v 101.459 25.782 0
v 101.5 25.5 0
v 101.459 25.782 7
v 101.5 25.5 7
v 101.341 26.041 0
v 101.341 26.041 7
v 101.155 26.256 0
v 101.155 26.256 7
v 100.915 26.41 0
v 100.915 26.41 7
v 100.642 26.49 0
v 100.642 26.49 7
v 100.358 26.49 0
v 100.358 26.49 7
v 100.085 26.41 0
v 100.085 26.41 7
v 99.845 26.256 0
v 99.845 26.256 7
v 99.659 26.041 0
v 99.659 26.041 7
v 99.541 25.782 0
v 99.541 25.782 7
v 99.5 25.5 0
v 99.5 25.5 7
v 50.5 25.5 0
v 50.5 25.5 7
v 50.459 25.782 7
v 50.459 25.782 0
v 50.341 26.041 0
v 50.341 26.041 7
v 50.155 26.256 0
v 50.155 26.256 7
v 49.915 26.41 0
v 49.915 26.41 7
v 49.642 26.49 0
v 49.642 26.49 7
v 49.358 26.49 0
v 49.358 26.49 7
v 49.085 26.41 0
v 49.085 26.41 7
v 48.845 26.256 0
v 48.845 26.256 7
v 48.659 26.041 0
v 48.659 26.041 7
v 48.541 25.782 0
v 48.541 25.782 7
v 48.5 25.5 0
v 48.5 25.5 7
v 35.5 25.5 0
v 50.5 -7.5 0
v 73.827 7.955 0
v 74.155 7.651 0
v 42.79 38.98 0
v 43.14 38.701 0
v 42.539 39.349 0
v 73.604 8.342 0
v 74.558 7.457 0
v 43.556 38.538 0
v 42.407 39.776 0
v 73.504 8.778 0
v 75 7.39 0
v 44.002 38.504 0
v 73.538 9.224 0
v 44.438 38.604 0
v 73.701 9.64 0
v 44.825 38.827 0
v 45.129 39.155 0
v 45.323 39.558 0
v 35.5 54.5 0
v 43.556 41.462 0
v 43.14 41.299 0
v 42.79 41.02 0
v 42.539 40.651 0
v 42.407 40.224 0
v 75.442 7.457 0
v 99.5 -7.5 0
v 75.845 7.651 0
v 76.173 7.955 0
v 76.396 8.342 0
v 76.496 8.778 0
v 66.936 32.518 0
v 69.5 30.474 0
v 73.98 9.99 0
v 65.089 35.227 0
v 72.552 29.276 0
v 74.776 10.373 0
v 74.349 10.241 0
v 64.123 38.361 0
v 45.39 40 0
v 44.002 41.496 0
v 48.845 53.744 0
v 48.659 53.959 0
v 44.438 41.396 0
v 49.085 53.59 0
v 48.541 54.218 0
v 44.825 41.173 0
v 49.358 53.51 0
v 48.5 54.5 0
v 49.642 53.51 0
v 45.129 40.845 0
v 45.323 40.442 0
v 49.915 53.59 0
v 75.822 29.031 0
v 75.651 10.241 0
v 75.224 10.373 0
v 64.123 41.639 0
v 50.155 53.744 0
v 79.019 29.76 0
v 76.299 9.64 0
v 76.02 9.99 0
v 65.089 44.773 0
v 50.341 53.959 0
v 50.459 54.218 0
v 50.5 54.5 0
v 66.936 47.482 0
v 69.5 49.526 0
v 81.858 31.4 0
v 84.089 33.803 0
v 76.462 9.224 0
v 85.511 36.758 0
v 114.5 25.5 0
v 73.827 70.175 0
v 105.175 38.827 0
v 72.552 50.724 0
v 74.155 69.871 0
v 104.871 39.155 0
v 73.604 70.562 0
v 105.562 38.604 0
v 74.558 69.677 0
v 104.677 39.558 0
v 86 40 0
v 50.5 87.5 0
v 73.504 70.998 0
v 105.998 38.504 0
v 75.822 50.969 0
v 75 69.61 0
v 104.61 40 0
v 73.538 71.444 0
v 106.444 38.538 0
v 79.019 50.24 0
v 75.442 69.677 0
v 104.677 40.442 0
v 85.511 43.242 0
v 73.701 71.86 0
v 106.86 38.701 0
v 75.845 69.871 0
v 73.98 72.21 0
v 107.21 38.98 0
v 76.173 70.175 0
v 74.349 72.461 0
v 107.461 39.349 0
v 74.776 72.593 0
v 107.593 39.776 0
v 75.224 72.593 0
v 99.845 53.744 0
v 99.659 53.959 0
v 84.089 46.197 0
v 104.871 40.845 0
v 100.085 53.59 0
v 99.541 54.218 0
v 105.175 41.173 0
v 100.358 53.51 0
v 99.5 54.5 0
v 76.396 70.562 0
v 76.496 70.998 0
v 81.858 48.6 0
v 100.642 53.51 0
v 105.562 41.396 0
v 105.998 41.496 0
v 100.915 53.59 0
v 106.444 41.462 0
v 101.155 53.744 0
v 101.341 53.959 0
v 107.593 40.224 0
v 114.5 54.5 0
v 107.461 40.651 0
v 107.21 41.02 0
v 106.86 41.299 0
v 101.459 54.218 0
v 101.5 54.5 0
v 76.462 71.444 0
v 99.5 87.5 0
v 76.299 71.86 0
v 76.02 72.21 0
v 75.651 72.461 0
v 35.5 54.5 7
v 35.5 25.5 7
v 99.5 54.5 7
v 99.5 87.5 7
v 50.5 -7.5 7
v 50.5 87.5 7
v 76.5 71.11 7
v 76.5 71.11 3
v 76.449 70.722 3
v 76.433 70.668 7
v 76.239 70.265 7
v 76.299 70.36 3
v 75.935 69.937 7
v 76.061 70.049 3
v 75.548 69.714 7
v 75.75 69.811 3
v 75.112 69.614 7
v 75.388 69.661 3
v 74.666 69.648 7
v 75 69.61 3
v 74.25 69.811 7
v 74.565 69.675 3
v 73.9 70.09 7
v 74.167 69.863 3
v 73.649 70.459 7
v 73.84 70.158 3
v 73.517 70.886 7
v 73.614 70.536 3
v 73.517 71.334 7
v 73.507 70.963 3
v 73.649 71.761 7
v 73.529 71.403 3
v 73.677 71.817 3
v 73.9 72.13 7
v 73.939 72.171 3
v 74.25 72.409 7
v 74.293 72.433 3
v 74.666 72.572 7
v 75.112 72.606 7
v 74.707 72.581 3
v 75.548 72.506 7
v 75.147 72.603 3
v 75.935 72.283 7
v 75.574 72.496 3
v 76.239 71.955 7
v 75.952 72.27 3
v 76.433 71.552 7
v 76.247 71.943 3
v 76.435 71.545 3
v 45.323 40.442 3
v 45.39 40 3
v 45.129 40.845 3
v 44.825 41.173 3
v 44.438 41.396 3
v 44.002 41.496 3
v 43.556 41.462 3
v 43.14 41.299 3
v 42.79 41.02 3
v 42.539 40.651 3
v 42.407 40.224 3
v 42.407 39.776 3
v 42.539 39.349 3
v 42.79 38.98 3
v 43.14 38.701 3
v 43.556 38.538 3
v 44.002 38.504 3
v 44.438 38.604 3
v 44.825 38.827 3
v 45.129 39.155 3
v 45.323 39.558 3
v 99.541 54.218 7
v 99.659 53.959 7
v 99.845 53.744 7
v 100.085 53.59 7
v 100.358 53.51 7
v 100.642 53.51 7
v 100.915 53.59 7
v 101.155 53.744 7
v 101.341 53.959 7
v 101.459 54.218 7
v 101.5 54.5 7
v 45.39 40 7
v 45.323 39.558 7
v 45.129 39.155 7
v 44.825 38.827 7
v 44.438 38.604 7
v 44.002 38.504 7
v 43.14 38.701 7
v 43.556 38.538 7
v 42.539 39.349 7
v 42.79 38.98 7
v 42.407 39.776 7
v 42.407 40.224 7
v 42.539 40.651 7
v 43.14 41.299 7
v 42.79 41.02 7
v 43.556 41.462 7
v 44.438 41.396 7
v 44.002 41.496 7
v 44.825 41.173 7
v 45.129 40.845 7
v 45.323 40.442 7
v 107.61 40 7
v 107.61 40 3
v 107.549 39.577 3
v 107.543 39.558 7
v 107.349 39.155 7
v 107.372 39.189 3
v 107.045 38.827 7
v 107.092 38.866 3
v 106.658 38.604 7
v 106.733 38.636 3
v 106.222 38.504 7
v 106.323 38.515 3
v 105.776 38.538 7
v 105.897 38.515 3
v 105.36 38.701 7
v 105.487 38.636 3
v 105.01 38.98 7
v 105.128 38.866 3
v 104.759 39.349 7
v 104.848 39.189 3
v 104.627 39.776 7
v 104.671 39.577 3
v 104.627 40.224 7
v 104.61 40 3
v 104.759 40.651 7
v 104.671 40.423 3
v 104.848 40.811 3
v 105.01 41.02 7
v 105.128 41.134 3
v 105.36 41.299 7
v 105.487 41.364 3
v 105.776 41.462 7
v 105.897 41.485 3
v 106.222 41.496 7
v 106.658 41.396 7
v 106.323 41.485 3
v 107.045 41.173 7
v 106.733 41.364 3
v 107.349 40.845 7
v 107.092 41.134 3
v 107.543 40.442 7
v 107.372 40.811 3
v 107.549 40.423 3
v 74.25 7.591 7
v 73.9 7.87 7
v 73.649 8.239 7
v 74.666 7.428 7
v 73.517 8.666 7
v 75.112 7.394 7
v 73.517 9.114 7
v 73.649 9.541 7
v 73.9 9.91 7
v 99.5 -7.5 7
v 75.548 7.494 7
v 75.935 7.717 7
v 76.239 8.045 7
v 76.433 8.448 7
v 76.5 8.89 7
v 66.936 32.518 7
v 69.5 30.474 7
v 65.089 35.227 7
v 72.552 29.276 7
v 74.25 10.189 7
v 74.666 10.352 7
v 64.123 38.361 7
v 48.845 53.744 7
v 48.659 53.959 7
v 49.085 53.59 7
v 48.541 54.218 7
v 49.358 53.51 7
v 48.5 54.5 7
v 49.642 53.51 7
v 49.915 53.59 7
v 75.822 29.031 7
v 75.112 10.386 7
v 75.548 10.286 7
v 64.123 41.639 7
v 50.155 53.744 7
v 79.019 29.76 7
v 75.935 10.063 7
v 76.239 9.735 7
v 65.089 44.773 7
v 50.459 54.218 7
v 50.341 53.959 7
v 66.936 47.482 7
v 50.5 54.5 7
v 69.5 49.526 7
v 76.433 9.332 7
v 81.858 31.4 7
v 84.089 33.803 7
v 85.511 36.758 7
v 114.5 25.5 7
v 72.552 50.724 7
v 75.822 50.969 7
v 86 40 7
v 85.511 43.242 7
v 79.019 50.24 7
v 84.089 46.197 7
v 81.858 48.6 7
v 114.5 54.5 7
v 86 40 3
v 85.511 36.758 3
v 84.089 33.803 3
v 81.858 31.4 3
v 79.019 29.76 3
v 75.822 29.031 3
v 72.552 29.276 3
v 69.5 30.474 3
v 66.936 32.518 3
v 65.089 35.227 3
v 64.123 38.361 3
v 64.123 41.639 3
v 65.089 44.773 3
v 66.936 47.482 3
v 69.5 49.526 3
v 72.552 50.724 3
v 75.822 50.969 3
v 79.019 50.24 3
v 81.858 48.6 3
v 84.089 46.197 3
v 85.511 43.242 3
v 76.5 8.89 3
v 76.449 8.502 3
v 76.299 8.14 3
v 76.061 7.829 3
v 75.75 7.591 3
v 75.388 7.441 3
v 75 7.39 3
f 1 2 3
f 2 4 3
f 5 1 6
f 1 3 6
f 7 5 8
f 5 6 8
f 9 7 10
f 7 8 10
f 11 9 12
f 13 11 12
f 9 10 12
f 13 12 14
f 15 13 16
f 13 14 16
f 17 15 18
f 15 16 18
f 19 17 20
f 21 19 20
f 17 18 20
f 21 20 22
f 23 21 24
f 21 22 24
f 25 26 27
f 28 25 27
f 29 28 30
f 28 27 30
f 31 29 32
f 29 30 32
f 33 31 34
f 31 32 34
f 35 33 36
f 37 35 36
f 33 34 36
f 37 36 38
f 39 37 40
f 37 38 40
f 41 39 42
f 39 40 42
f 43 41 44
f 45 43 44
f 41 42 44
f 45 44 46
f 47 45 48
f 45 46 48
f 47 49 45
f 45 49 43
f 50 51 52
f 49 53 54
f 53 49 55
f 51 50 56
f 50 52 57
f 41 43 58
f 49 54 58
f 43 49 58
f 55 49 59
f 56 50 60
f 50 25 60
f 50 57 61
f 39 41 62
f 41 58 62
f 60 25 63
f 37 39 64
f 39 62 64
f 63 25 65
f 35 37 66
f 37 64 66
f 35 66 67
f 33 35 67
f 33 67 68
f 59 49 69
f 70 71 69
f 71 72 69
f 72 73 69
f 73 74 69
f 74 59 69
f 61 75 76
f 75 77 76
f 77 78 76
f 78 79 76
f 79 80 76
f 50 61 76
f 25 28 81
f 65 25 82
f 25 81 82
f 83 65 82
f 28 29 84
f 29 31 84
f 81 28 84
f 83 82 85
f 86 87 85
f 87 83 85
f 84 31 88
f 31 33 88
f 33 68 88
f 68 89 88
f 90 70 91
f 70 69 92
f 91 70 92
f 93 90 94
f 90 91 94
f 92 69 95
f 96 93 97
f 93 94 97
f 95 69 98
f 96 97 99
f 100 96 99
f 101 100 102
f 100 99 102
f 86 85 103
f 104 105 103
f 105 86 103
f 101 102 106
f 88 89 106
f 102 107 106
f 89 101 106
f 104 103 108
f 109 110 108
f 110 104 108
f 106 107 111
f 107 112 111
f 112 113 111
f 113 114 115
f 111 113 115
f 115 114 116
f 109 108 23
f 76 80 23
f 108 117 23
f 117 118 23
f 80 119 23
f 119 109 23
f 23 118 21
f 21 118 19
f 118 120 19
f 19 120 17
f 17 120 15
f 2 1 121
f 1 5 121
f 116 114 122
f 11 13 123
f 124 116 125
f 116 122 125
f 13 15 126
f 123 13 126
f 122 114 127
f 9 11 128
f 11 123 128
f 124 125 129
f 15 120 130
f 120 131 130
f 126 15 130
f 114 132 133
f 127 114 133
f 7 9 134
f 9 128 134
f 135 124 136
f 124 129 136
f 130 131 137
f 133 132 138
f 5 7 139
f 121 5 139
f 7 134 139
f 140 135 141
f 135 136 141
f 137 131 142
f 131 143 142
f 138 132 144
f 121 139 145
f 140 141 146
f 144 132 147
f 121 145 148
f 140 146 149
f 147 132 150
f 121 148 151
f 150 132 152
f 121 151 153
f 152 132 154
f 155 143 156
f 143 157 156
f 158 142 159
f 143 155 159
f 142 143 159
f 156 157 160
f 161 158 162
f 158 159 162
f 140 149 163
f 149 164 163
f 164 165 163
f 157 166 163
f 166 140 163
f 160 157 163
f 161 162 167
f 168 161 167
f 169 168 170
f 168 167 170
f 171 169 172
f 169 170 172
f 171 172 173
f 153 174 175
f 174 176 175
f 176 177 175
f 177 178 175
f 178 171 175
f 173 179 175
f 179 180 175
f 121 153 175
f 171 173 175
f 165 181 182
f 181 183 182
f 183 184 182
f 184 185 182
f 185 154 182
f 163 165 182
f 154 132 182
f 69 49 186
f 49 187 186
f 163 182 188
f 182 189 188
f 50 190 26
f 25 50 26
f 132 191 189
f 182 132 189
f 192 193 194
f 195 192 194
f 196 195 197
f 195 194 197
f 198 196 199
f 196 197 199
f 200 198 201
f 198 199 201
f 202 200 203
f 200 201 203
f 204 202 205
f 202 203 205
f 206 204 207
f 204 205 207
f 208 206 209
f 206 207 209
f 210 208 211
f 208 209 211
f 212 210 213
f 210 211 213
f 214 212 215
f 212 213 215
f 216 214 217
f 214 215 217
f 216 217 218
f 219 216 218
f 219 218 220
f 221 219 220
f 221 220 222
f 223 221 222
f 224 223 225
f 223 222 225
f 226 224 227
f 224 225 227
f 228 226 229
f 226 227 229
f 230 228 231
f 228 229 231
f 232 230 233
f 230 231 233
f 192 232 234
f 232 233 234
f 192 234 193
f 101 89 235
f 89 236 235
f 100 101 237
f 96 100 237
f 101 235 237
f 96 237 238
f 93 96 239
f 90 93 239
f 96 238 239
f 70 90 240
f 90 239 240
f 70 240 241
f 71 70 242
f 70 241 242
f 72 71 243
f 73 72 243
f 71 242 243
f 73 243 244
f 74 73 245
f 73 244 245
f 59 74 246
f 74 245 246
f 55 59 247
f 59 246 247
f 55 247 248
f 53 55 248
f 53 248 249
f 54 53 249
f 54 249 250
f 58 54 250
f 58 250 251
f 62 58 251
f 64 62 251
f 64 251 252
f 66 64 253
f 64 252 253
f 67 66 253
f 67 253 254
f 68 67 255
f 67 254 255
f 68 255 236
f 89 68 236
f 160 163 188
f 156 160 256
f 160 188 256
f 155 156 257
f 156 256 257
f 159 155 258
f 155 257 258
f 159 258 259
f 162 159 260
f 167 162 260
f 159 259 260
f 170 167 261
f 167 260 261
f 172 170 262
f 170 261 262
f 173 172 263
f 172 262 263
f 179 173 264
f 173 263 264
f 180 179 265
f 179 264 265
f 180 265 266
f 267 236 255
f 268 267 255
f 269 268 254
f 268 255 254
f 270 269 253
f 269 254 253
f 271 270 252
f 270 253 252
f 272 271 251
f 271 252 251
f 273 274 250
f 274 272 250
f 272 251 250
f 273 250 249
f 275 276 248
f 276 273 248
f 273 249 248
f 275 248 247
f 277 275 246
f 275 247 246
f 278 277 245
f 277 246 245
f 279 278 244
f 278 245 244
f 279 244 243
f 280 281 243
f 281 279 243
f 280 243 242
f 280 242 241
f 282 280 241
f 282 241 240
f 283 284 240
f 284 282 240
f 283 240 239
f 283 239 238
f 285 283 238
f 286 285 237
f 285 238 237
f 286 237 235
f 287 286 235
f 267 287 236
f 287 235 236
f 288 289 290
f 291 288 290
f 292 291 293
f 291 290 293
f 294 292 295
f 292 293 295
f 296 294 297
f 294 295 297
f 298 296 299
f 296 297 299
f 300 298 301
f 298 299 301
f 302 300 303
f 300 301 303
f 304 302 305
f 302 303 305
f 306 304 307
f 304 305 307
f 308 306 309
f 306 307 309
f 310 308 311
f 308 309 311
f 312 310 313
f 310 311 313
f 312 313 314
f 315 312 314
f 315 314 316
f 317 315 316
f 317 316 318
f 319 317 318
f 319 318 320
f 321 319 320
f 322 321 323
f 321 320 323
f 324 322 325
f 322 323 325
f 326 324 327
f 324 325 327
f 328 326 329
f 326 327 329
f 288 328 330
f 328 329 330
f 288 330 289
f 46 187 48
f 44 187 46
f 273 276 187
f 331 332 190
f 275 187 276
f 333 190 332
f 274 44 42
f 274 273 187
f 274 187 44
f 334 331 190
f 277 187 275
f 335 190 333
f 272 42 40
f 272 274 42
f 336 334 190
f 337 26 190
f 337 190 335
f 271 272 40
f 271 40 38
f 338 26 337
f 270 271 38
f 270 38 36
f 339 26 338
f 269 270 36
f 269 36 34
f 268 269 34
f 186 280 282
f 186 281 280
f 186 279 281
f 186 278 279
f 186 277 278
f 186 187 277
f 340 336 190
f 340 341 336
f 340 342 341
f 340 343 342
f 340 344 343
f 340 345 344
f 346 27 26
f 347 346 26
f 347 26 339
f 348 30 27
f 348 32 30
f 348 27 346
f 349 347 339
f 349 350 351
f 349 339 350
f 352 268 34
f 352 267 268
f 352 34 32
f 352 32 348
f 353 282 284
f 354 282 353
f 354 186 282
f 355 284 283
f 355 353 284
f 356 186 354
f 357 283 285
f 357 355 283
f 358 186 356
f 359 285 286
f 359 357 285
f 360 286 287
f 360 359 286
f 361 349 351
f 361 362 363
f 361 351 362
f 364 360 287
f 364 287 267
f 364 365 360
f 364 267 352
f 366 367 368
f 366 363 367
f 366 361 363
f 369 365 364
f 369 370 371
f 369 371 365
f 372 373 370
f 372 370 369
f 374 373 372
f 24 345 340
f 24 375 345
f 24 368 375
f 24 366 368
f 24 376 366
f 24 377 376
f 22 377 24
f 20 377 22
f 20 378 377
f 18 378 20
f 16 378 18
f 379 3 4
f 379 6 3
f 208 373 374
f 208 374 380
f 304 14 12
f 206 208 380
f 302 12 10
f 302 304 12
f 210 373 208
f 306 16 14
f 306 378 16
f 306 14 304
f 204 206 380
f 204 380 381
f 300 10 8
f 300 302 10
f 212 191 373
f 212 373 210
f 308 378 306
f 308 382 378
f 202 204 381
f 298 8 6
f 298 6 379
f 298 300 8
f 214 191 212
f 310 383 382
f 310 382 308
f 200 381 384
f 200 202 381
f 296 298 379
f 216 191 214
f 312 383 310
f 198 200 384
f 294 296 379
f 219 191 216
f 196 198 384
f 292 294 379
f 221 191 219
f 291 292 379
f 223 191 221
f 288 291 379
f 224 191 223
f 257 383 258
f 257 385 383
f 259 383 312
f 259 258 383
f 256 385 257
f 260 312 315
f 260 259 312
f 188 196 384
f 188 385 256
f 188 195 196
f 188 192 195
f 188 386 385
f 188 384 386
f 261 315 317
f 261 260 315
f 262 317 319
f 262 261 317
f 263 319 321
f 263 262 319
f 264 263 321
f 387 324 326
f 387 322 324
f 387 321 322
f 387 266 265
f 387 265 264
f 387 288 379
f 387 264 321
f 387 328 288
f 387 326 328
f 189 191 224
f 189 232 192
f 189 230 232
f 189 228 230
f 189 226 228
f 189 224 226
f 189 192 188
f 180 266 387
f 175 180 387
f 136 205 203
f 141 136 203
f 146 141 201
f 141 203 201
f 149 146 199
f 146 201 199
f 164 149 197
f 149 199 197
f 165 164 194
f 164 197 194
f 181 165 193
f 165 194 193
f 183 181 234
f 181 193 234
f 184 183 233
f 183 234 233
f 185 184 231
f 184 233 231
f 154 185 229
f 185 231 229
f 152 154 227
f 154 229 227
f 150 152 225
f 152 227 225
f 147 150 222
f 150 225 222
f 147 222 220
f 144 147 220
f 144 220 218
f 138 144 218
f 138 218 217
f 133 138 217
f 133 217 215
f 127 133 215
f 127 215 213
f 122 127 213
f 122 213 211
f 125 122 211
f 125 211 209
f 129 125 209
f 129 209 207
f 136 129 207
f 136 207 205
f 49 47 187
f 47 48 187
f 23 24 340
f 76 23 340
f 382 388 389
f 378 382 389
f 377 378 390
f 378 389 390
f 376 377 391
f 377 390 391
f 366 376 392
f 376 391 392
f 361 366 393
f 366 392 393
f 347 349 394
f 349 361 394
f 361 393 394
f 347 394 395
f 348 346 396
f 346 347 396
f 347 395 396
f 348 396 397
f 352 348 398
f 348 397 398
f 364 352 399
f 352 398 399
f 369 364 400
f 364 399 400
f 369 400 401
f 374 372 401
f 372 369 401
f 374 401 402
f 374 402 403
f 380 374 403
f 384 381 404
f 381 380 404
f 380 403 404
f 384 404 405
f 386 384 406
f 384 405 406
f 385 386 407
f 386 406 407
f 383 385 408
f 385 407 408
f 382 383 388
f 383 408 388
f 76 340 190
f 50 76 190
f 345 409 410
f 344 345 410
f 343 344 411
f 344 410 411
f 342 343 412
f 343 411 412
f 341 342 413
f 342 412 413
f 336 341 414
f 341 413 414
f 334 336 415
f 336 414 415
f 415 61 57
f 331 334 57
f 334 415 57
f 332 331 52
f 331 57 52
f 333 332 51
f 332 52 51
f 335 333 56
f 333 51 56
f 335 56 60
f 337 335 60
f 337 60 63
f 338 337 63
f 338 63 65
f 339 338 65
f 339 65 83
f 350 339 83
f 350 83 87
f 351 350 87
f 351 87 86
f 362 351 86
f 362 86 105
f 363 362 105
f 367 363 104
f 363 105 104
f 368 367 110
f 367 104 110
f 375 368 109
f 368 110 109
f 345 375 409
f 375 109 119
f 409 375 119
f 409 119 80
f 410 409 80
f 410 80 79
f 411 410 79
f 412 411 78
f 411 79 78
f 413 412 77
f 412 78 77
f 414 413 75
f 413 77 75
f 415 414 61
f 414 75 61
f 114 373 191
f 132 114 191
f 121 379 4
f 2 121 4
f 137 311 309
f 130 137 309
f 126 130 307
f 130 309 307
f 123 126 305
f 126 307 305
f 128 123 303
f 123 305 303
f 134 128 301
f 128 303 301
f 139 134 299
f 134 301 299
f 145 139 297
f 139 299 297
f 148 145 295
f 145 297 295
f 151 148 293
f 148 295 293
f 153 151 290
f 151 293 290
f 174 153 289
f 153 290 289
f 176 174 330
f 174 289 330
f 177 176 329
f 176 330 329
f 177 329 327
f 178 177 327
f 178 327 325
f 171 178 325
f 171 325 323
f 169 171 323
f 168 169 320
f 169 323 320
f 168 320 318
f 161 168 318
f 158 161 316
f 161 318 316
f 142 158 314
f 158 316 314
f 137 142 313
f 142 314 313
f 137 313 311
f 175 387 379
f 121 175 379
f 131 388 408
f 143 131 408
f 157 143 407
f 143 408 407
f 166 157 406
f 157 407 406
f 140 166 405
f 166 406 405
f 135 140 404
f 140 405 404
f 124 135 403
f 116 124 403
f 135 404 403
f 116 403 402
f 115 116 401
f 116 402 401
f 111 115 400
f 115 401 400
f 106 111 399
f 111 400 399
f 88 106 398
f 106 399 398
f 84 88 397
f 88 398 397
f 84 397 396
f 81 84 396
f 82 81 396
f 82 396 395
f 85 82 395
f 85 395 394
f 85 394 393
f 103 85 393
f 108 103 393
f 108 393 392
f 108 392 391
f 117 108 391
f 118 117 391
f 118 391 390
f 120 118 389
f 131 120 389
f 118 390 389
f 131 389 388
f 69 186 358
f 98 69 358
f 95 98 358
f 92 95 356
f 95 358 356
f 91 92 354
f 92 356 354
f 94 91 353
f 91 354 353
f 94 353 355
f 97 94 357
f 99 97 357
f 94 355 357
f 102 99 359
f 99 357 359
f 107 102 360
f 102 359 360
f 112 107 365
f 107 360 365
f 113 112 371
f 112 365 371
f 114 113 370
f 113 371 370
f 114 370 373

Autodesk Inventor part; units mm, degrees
ref_plane "YZ Plane" through (0, 0, 0) normal (1, 0, 0) x (0, 1, 0)
ref_plane "XZ Plane" through (0, 0, 0) normal (0, 1, 0) x (-1, 0, 0)
ref_plane "XY Plane" through (0, 0, 0) normal (0, 0, 1) x (1, 0, 0)
sketch "Sketch1" plane through (0, 0, 0) normal (0, 0, 1) x (1, 0, 0)
  line L0 (-75, 40) -> (75, 40)
  line L1 (75, 40) -> (75, -40)
  line L2 (75, -40) -> (-75, -40)
  line L3 (-75, -40) -> (-75, 40)
  point P0 (0, 0)
  dimension "d0" = 150
  dimension "d1" = 80
  dimension "d2" = 40
  dimension "d3" = 75
extrude "Vlak" add sketch "Sketch1" along normal blind 3
sketch "Sketch3" plane through (0, 0, 3) normal (0, 0, 1) x (1, 0, 0)
  line L0 (75, 40) -> (75, -40) projected
  line L1 (-75, 40) -> (75, 40) projected
  circle A0 centre (75, 40) radius 10
  point P0 (0, 0)
  dimension "d12" = 20
  dimension "d13" = 0
  dimension "d14" = 0
extrude "Centergat" cut sketch "Sketch3" against normal blind 3
sketch "Sketch4" plane through (0, 0, 3) normal (0, 0, 1) x (1, 0, 0)
  line L0 (-75, 40) -> (65, 40) projected
  line L1 (75, -40) -> (-75, -40) projected
  line L2 (18.8539, 53.8539) -> (-131.8943, -96.8943) construction
  circle A0 centre (-155, -120) radius 150
  point P0 (0, 0)
  dimension "d17" = 0
  dimension "d18" = 45
  dimension "d19" = 300
  dimension "d20" = 0
  dimension "d21" = 160
extrude "PropellorSpace" cut sketch "Sketch4" against normal blind 3
sketch "Sketch5" plane through (0, 0, 3) normal (0, 0, 1) x (1, 0, 0)
  arc A0 (-28.1142, -40) -> (-75, 6.8858) centre (-155, -120) ccw projected
  line L0 (75, -40) -> (-28.1142, -40) projected
  line L1 (-75, 40) -> (65, 40) projected
  line L2 (-155, -120) -> (34.1296, 69.1296) construction
  line L3 (-168.3606, -98.0053) -> (-8.8118, 61.5435) construction
  line L4 (-132.6124, -132.9677) -> (63.849, 63.4937) construction
  line L5 (-208.1378, -57.7825) -> (-104.1378, -161.7825) construction
  line L6 (-25.5995, -23.1264) -> (-11.4573, -8.9842)
  line L7 (-11.4573, -8.9842) -> (-8.6289, -11.8127)
  line L8 (-8.6289, -11.8127) -> (-22.771, -25.9548)
  line L9 (-22.771, -25.9548) -> (-25.5995, -23.1264)
  line L10 (-60.9548, 12.229) -> (-46.8127, 26.3711)
  line L11 (-46.8127, 26.3711) -> (-43.9842, 23.5427)
  line L12 (-43.9842, 23.5427) -> (-58.1264, 9.4005)
  line L13 (-58.1264, 9.4005) -> (-60.9548, 12.229)
  line L14 (13.2914, 15.7645) -> (27.4335, 29.9066)
  line L15 (27.4335, 29.9066) -> (30.262, 27.0782)
  line L16 (30.262, 27.0782) -> (16.1198, 12.9361)
  line L17 (16.1198, 12.9361) -> (13.2914, 15.7645)
  line L18 (-62.0184, 71.663) -> (40.1093, -30.4647) construction
  line L19 (-7.9217, 14.7379) -> (-22.0638, 28.88)
  line L20 (-22.0638, 28.88) -> (-19.2354, 31.7085)
  line L21 (-19.2354, 31.7085) -> (-5.0932, 17.5663)
  line L22 (-5.0932, 17.5663) -> (-7.9217, 14.7379)
  point P0 (0, 0)
  point P1 (-168.1378, -97.7825)
  point P2 (-132.7825, -133.1378)
  point P3 (-30.3553, 40)
  dimension "d24" = 45
  dimension "d25" = 0
  dimension "d26" = 90
  dimension "d27" = 25
  dimension "d28" = 25
  dimension "d29" = 0
  dimension "d30" = 0
  dimension "d31" = 0
  dimension "d32" = 20
  dimension "d33" = 4
  dimension "d34" = 20
  dimension "d35" = 4
  dimension "d36" = 0
  dimension "d37" = 2
  dimension "d38" = 0
  dimension "d39" = 2
  dimension "d40" = 160
  dimension "d41" = 160
  dimension "d44" = 55
  dimension "d49" = 45
  dimension "d50" = 0
  dimension "d51" = 0
  dimension "d52" = 0
  dimension "d53" = 21.2742
  dimension "d54" = 20
  dimension "d55" = 4
  dimension "d56" = 0
  dimension "d57" = 2
  dimension "d58" = 13.726
extrude "Armsteunen" cut sketch "Sketch5" against normal blind 3
sketch "Sketch6" plane through (0, 0, 3) normal (0, 0, 1) x (1, 0, 0)
  line L0 (75, -40) -> (-28.1142, -40) projected
  line L1 (75, 30) -> (75, -40) projected
  line L2 (-75, 40) -> (65, 40) projected
  line L3 (-75, 6.8858) -> (-75, 40) projected
  circle A0 centre (55, -20) radius 1.5
  circle A1 centre (15, -20) radius 1.5
  circle A2 centre (-13.9878, -20) radius 1.5
  circle A3 centre (-34.4939, 0.5061) radius 1.5
  circle A4 centre (43.89, 40) radius 1.5
  circle A5 centre (26.0122, 20) radius 1.5
  circle A6 centre (5, 40) radius 1.5
  circle A7 centre (-55, 21.0122) radius 1.5
  circle A8 centre (-55, 30) radius 1.5
  line L4 (-55, 21.0122) -> (-13.9878, -20) construction
  line L5 (-34.4939, 0.5061) -> (12.7873, 47.7873) construction
  circle A9 centre (-40.4428, 35) radius 1.5
  circle A10 centre (3.6899, -2.3223) radius 1.5
  circle A11 centre (-16.8162, 18.1838) radius 1.5
  arc A12 (65, 40) -> (75, 30) centre (75, 40) ccw projected
  circle A13 centre (75, 8.89) radius 1.5
  point P0 (0, 0)
  point P1 (-43.9842, 23.5427)
  point P2 (-11.4573, -8.9842)
  dimension "d61" = 3
  dimension "d62" = 3
  dimension "d63" = 3
  dimension "d64" = 3
  dimension "d65" = 3
  dimension "d66" = 3
  dimension "d67" = 3
  dimension "d68" = 3
  dimension "d69" = 3
  dimension "d70" = 20
  dimension "d71" = 20
  dimension "d72" = 20
  dimension "d73" = 60
  dimension "d75" = 20
  dimension "d76" = 31.11
  dimension "d77" = 0
  dimension "d78" = 20
  dimension "d80" = 10
  dimension "d82" = 20
  dimension "d83" = 20
  dimension "d84" = 0
  dimension "d87" = 45
  dimension "d88" = 0
  dimension "d89" = 0
  dimension "d90" = 3
  dimension "d101" = 3
  dimension "d103" = 29
  dimension "d106" = 3
  dimension "d107" = 0
  dimension "d111" = 3
  dimension "d112" = 0
  dimension "d113" = 31.11
  dimension "d166" = 29
  dimension "d167" = 23
  dimension "d168" = 23
  dimension "d169" = 29
  dimension "d170" = 25
  dimension "d171" = 25
  dimension "d172" = 29
  dimension "d175" = 29
  dimension "d179" = 5
  dimension "d182" = 43.9962
extrude "Holes" cut sketch "Sketch6" against normal blind 3
sketch "Sketch10" plane through (0, 0, 3) normal (0, 0, 1) x (1, 0, 0)
  line L0 (45.39, 40) -> (65, 40) projected
  line L1 (6.5, 40) -> (42.39, 40) projected
  line L2 (75, 7.39) -> (75, -40) projected
  line L3 (45, -8) -> (65, -8)
  line L4 (65, -8) -> (65, -12)
  line L5 (65, -12) -> (45, -12)
  line L6 (45, -12) -> (45, -8)
  line L7 (31, 30) -> (35, 30)
  line L8 (35, 30) -> (35, 10)
  line L9 (35, 10) -> (31, 10)
  line L10 (31, 10) -> (31, 30)
  line L11 (5, -8) -> (25, -8)
  line L12 (25, -8) -> (25, -12)
  line L13 (25, -12) -> (5, -12)
  line L14 (5, -12) -> (5, -8)
  point P0 (0, 0)
  point P1 (-8.6289, -11.8127)
  dimension "d114" = 20
  dimension "d115" = 4
  dimension "d116" = 4
  dimension "d117" = 20
  dimension "d118" = 10
  dimension "d119" = 48
  dimension "d120" = 40
  dimension "d121" = 10
  dimension "d124" = 40
  dimension "d164" = 13.6289
  dimension "d165" = 10
extrude "InternalStructure" cut sketch "Sketch10" against normal blind 3
sketch "Sketch11" plane through (0, 0, 3) normal (0, 0, 1) x (1, 0, 0)
  line L0 (25, -8) -> (25, -12) projected
  line L1 (-25.5995, -23.1264) -> (-11.4573, -8.9842) projected
  circle A0 centre (15, -20) radius 1.5 projected
  circle A1 centre (-34.4939, 0.5061) radius 1.5 projected
  line L2 (6.5, 40) -> (42.39, 40) projected
  line L3 (75, 7.39) -> (75, -40) projected
  line L4 (40, 25) -> (50, 25)
  line L5 (50, 25) -> (50, 0)
  line L6 (50, 0) -> (40, 0)
  line L7 (40, 0) -> (40, 25)
  line L8 (25, -15) -> (45, -15)
  line L9 (45, -15) -> (45, -25)
  line L10 (45, -25) -> (25, -25)
  line L11 (25, -25) -> (25, -15)
  line L12 (-24.6985, 17.3726) -> (-17.6274, 10.3015)
  line L13 (-17.6274, 10.3015) -> (-28.234, -0.3051)
  line L14 (-28.234, -0.3051) -> (-35.3051, 6.766)
  line L15 (-35.3051, 6.766) -> (-24.6985, 17.3726)
  line L16 (-7.9217, 14.7379) -> (-22.0638, 28.88) projected
  point P0 (0, 0)
  dimension "d134" = 10
  dimension "d135" = 25
  dimension "d136" = 25
  dimension "d137" = 15
  dimension "d138" = 20
  dimension "d139" = 10
  dimension "d140" = 0
  dimension "d141" = 5
  dimension "d142" = 10
  dimension "d144" = 0
  dimension "d145" = 5
  dimension "d180" = 10
  dimension "d181" = 15
extrude "CablingHoles" cut sketch "Sketch11" against normal blind 3 contours L4 L5 L6 L7 | L8 L9 L10 L11 | L12 L13 L14 L15
sketch "Sketch12" plane through (0, 0, 3) normal (0, 0, 1) x (1, 0, 0)
  line L0 (75, -40) -> (-28.1142, -40) projected
  line L1 (75, 7.39) -> (75, -40) projected
  arc A0 (75, -26.5) -> (-28.1142, -40) centre (76.1332, -435.7032) ccw
  line L2 (45, -25) -> (25, -25) projected
  line L3 (5, -8) -> (25, -8) projected
  line L4 (35, 30) -> (35, -49) construction
  line L5 (65, -8) -> (-10, -8) construction
  circle A1 centre (29, -5) radius 1.5
  circle A2 centre (38, -5) radius 1.5
  line L6 (16.1198, 12.9361) -> (13.2914, 15.7645) projected
  line L7 (-7.9217, 14.7379) -> (-22.0638, 28.88) projected
  line L8 (-22.0638, 28.88) -> (-19.2354, 31.7085) projected
  line L9 (-19.2354, 31.7085) -> (-5.0932, 17.5663) projected
  line L10 (-46.8127, 26.3711) -> (-43.9842, 23.5427) projected
  line L11 (-43.9842, 23.5427) -> (-58.1264, 9.4005) projected
  point P0 (0, 0)
  dimension "d149" = 13.5
  dimension "d150" = 103.1142
  dimension "d151" = 40
  dimension "d156" = 3
  dimension "d157" = 3
  dimension "d158" = 3
  dimension "d159" = 3
  dimension "d160" = 6
  dimension "d161" = 3
  dimension "d176" = 11.7258
  dimension "d177" = 11.726
  dimension "d178" = 19.2742
extrude "BodyReshape" cut sketch "Sketch12" against normal blind 3
sketch "Sketch14" plane through (0, 0, 3) normal (0, 0, 1) x (1, 0, 0)
  arc A0 (75, -26.5) -> (-28.1142, -40) centre (76.1332, -435.7032) ccw projected
  line L0 (75, 7.39) -> (75, -26.5) projected
  arc A1 (75, 10.39) -> (75, 7.39) centre (75, 8.89) ccw projected
  line L1 (75, 30) -> (75, 10.39) projected
  arc A2 (65, 40) -> (75, 30) centre (75, 40) ccw projected
  line L2 (45.39, 40) -> (65, 40) projected
  arc A3 (42.39, 40) -> (45.39, 40) centre (43.89, 40) ccw projected
  line L3 (6.5, 40) -> (42.39, 40) projected
  arc A4 (3.5, 40) -> (6.5, 40) centre (5, 40) ccw projected
  line L4 (-75, 40) -> (3.5, 40) projected
  arc A5 (-28.1142, -40) -> (-75, 6.8858) centre (-155, -120) ccw projected
  circle A6 centre (-55, 21.0122) radius 1.5 projected
  circle A7 centre (-34.4939, 0.5061) radius 1.5 projected
  circle A8 centre (-13.9878, -20) radius 1.5 projected
  circle A9 centre (55, -20) radius 1.5 projected
  circle A10 centre (-16.8162, 18.1838) radius 1.5 projected
  circle A11 centre (3.6899, -2.3223) radius 1.5 projected
  circle A12 centre (-55, 30) radius 1.5 projected
  circle A13 centre (15, -20) radius 1.5 projected
  circle A14 centre (26.0122, 20) radius 1.5 projected
  circle A15 centre (-40.4428, 35) radius 1.5 projected
  circle A16 centre (29, -5) radius 1.5 projected
  circle A17 centre (38, -5) radius 1.5 projected
  arc A18 (178.1142, -40) -> (75, -26.5) centre (73.8668, -435.7032) ccw
  arc A19 (75, 7.39) -> (75, 10.39) centre (75, 8.89) ccw
  arc A20 (75, 30) -> (85, 40) centre (75, 40) ccw
  line L5 (104.61, 40) -> (85, 40)
  arc A21 (104.61, 40) -> (107.61, 40) centre (106.11, 40) ccw
  line L6 (143.5, 40) -> (107.61, 40)
  arc A22 (143.5, 40) -> (146.5, 40) centre (145, 40) ccw
  line L7 (225, 40) -> (146.5, 40)
  line L8 (225, 6.8858) -> (225, 40)
  arc A23 (225, 6.8858) -> (178.1142, -40) centre (305, -120) ccw
  circle A24 centre (205, 21.0122) radius 1.5
  circle A25 centre (184.4939, 0.5061) radius 1.5
  circle A26 centre (163.9878, -20) radius 1.5
  circle A27 centre (95, -20) radius 1.5
  circle A28 centre (166.8162, 18.1838) radius 1.5
  circle A29 centre (146.3101, -2.3223) radius 1.5
  circle A30 centre (205, 30) radius 1.5
  circle A31 centre (135, -20) radius 1.5
  circle A32 centre (123.9878, 20) radius 1.5
  circle A33 centre (190.4428, 35) radius 1.5
  line L9 (208.1264, 9.4005) -> (210.9548, 12.229)
  line L10 (210.9548, 12.229) -> (196.8127, 26.3711)
  line L11 (196.8127, 26.3711) -> (193.9842, 23.5427)
  line L12 (193.9842, 23.5427) -> (208.1264, 9.4005)
  line L13 (155.0932, 17.5663) -> (157.9217, 14.7379)
  line L14 (157.9217, 14.7379) -> (172.0638, 28.88)
  line L15 (172.0638, 28.88) -> (169.2354, 31.7085)
  line L16 (169.2354, 31.7085) -> (155.0932, 17.5663)
  line L17 (172.771, -25.9548) -> (175.5995, -23.1264)
  line L18 (175.5995, -23.1264) -> (161.4573, -8.9842)
  line L19 (161.4573, -8.9842) -> (158.6289, -11.8127)
  line L20 (158.6289, -11.8127) -> (172.771, -25.9548)
  line L21 (136.7086, 15.7645) -> (122.5665, 29.9066)
  line L22 (122.5665, 29.9066) -> (119.738, 27.0782)
  line L23 (119.738, 27.0782) -> (133.8802, 12.9361)
  line L24 (133.8802, 12.9361) -> (136.7086, 15.7645)
  line L25 (105, -12) -> (105, -8)
  line L26 (105, -8) -> (85, -8)
  line L27 (85, -8) -> (85, -12)
  line L28 (85, -12) -> (105, -12)
  line L29 (145, -12) -> (145, -8)
  line L30 (145, -8) -> (125, -8)
  line L31 (125, -8) -> (125, -12)
  line L32 (125, -12) -> (145, -12)
  line L33 (119, 10) -> (119, 30)
  line L34 (119, 30) -> (115, 30)
  line L35 (115, 30) -> (115, 10)
  line L36 (115, 10) -> (119, 10)
  line L37 (185.3051, 6.766) -> (174.6985, 17.3726)
  line L38 (174.6985, 17.3726) -> (167.6274, 10.3015)
  line L39 (167.6274, 10.3015) -> (178.234, -0.3051)
  line L40 (178.234, -0.3051) -> (185.3051, 6.766)
  line L41 (110, 0) -> (110, 25)
  line L42 (110, 25) -> (100, 25)
  line L43 (100, 25) -> (100, 0)
  line L44 (100, 0) -> (110, 0)
  line L45 (125, -25) -> (125, -15)
  line L46 (125, -15) -> (105, -15)
  line L47 (105, -15) -> (105, -25)
  line L48 (105, -25) -> (125, -25)
  circle A34 centre (121, -5) radius 1.5
  circle A35 centre (112, -5) radius 1.5
  arc A36 (-28.1142, 120) -> (75, 106.5) centre (76.1332, 515.7032) ccw
  line L49 (75, 72.61) -> (75, 106.5)
  arc A37 (75, 72.61) -> (75, 69.61) centre (75, 71.11) ccw
  line L50 (75, 50) -> (75, 69.61)
  arc A38 (75, 50) -> (65, 40) centre (75, 40) ccw
  arc A39 (45.39, 40) -> (42.39, 40) centre (43.89, 40) ccw
  arc A40 (6.5, 40) -> (3.5, 40) centre (5, 40) ccw
  line L51 (-75, 73.1142) -> (-75, 40)
  arc A41 (-75, 73.1142) -> (-28.1142, 120) centre (-155, 200) ccw
  circle A42 centre (-55, 58.9878) radius 1.5
  circle A43 centre (-34.4939, 79.4939) radius 1.5
  circle A44 centre (-13.9878, 100) radius 1.5
  circle A45 centre (55, 100) radius 1.5
  circle A46 centre (-16.8162, 61.8162) radius 1.5
  circle A47 centre (3.6899, 82.3223) radius 1.5
  circle A48 centre (-55, 50) radius 1.5
  circle A49 centre (15, 100) radius 1.5
  circle A50 centre (26.0122, 60) radius 1.5
  circle A51 centre (-40.4428, 45) radius 1.5
  line L52 (-58.1264, 70.5995) -> (-60.9548, 67.771)
  line L53 (-60.9548, 67.771) -> (-46.8127, 53.6289)
  line L54 (-46.8127, 53.6289) -> (-43.9842, 56.4573)
  line L55 (-43.9842, 56.4573) -> (-58.1264, 70.5995)
  line L56 (-5.0932, 62.4337) -> (-7.9217, 65.2621)
  line L57 (-7.9217, 65.2621) -> (-22.0638, 51.12)
  line L58 (-22.0638, 51.12) -> (-19.2354, 48.2915)
  line L59 (-19.2354, 48.2915) -> (-5.0932, 62.4337)
  line L60 (-22.771, 105.9548) -> (-25.5995, 103.1264)
  line L61 (-25.5995, 103.1264) -> (-11.4573, 88.9842)
  line L62 (-11.4573, 88.9842) -> (-8.6289, 91.8127)
  line L63 (-8.6289, 91.8127) -> (-22.771, 105.9548)
  line L64 (13.2914, 64.2355) -> (27.4335, 50.0934)
  line L65 (27.4335, 50.0934) -> (30.262, 52.9218)
  line L66 (30.262, 52.9218) -> (16.1198, 67.0639)
  line L67 (16.1198, 67.0639) -> (13.2914, 64.2355)
  line L68 (45, 92) -> (45, 88)
  line L69 (45, 88) -> (65, 88)
  line L70 (65, 88) -> (65, 92)
  line L71 (65, 92) -> (45, 92)
  line L72 (5, 92) -> (5, 88)
  line L73 (5, 88) -> (25, 88)
  line L74 (25, 88) -> (25, 92)
  line L75 (25, 92) -> (5, 92)
  line L76 (31, 70) -> (31, 50)
  line L77 (31, 50) -> (35, 50)
  line L78 (35, 50) -> (35, 70)
  line L79 (35, 70) -> (31, 70)
  line L80 (-35.3051, 73.234) -> (-24.6985, 62.6274)
  line L81 (-24.6985, 62.6274) -> (-17.6274, 69.6985)
  line L82 (-17.6274, 69.6985) -> (-28.234, 80.3051)
  line L83 (-28.234, 80.3051) -> (-35.3051, 73.234)
  line L84 (40, 80) -> (40, 55)
  line L85 (40, 55) -> (50, 55)
  line L86 (50, 55) -> (50, 80)
  line L87 (50, 80) -> (40, 80)
  line L88 (25, 105) -> (25, 95)
  line L89 (25, 95) -> (45, 95)
  line L90 (45, 95) -> (45, 105)
  line L91 (45, 105) -> (25, 105)
  circle A52 centre (29, 85) radius 1.5
  circle A53 centre (38, 85) radius 1.5
  line L92 (100, 80) -> (110, 80)
  line L93 (115, 70) -> (119, 70)
  line L94 (100, 55) -> (100, 80)
  line L95 (110, 55) -> (100, 55)
  line L96 (119, 70) -> (119, 50)
  line L97 (119, 50) -> (115, 50)
  line L98 (115, 50) -> (115, 70)
  arc A54 (75, 69.61) -> (75, 72.61) centre (75, 71.11) ccw
  arc A55 (85, 40) -> (75, 50) centre (75, 40) ccw
  line L99 (110, 80) -> (110, 55)
  line L100 (178.234, 80.3051) -> (185.3051, 73.234)
  line L101 (167.6274, 69.6985) -> (178.234, 80.3051)
  arc A56 (178.1142, 120) -> (225, 73.1142) centre (305, 200) ccw
  circle A57 centre (184.4939, 79.4939) radius 1.5
  line L102 (161.4573, 88.9842) -> (158.6289, 91.8127)
  line L103 (175.5995, 103.1264) -> (161.4573, 88.9842)
  line L104 (158.6289, 91.8127) -> (172.771, 105.9548)
  line L105 (172.771, 105.9548) -> (175.5995, 103.1264)
  circle A58 centre (163.9878, 100) radius 1.5
  line L106 (105, 88) -> (85, 88)
  line L107 (85, 88) -> (85, 92)
  line L108 (85, 92) -> (105, 92)
  circle A59 centre (95, 100) radius 1.5
  line L109 (174.6985, 62.6274) -> (167.6274, 69.6985)
  line L110 (185.3051, 73.234) -> (174.6985, 62.6274)
  circle A60 centre (166.8162, 61.8162) radius 1.5
  line L111 (208.1264, 70.5995) -> (210.9548, 67.771)
  line L112 (196.8127, 53.6289) -> (193.9842, 56.4573)
  line L113 (193.9842, 56.4573) -> (208.1264, 70.5995)
  circle A61 centre (205, 58.9878) radius 1.5
  line L114 (210.9548, 67.771) -> (196.8127, 53.6289)
  circle A62 centre (190.4428, 45) radius 1.5
  line L115 (155.0932, 62.4337) -> (157.9217, 65.2621)
  line L116 (172.0638, 51.12) -> (169.2354, 48.2915)
  line L117 (157.9217, 65.2621) -> (172.0638, 51.12)
  line L118 (169.2354, 48.2915) -> (155.0932, 62.4337)
  circle A63 centre (205, 50) radius 1.5
  line L119 (225, 73.1142) -> (225, 40)
  circle A64 centre (112, 85) radius 1.5
  line L120 (105, 92) -> (105, 88)
  circle A65 centre (121, 85) radius 1.5
  line L121 (125, 88) -> (125, 92)
  line L122 (125, 95) -> (105, 95)
  line L123 (105, 95) -> (105, 105)
  line L124 (125, 105) -> (125, 95)
  line L125 (105, 105) -> (125, 105)
  arc A66 (75, 106.5) -> (178.1142, 120) centre (73.8668, 515.7032) ccw
  arc A67 (107.61, 40) -> (104.61, 40) centre (106.11, 40) ccw
  arc A68 (146.5, 40) -> (143.5, 40) centre (145, 40) ccw
  line L126 (133.8802, 67.0639) -> (136.7086, 64.2355)
  line L127 (136.7086, 64.2355) -> (122.5665, 50.0934)
  line L128 (122.5665, 50.0934) -> (119.738, 52.9218)
  line L129 (119.738, 52.9218) -> (133.8802, 67.0639)
  circle A69 centre (123.9878, 60) radius 1.5
  line L130 (145, 92) -> (145, 88)
  line L131 (145, 88) -> (125, 88)
  line L132 (125, 92) -> (145, 92)
  circle A70 centre (135, 100) radius 1.5
  circle A71 centre (146.3101, 82.3223) radius 1.5
  point P0 (-58.1264, 9.4005)
  point P1 (-60.9548, 12.229)
  point P2 (-46.8127, 26.3711)
  point P3 (-43.9842, 23.5427)
  point P4 (-5.0932, 17.5663)
  point P5 (-7.9217, 14.7379)
  point P6 (-22.0638, 28.88)
  point P7 (-19.2354, 31.7085)
  point P8 (-22.771, -25.9548)
  point P9 (-25.5995, -23.1264)
  point P10 (-11.4573, -8.9842)
  point P11 (-8.6289, -11.8127)
  point P12 (13.2914, 15.7645)
  point P13 (27.4335, 29.9066)
  point P14 (30.262, 27.0782)
  point P15 (16.1198, 12.9361)
  point P16 (45, -12)
  point P17 (45, -8)
  point P18 (65, -8)
  point P19 (65, -12)
  point P20 (5, -12)
  point P21 (5, -8)
  point P22 (25, -8)
  point P23 (25, -12)
  point P24 (31, 10)
  point P25 (31, 30)
  point P26 (35, 30)
  point P27 (35, 10)
  point P28 (-35.3051, 6.766)
  point P29 (-24.6985, 17.3726)
  point P30 (-17.6274, 10.3015)
  point P31 (-28.234, -0.3051)
  point P32 (40, 0)
  point P33 (40, 25)
  point P34 (50, 25)
  point P35 (50, 0)
  point P36 (25, -25)
  point P37 (25, -15)
  point P38 (45, -15)
  point P39 (45, -25)
  point P40 (0, 0)
  point P41 (150, 0)
  point P42 (0, 80)
  point P43 (150, 80)
extrude "Mirroring" add sketch "Sketch14" against normal blind 3 contours A19 L1 A20 L5 A21 L6 A22 L7 L8 A23 A18 L0 | L2 A39 L3 A40 L4 L51 A41 A36 L49 A37 L50 A38 | A55 L50 A54 L49 A66 A56 L119 L7 A68 L6 A67 L5
sketch "Sketch15" plane through (0, 0, 3) normal (0, 0, 1) x (1, 0, 0)
  circle A0 centre (75, 40) radius 10 projected
  circle A1 centre (75, 8.89) radius 1.5 projected
  circle A2 centre (75, 71.11) radius 1.5 projected
  circle A3 centre (106.11, 40) radius 1.5 projected
  line L0 (115, 50) -> (115, 70) projected
  line L1 (110, 55) -> (100, 55) projected
  line L2 (35, 70) -> (35, 50) projected
  line L3 (115, 10) -> (115, 30) projected
  circle A4 centre (43.89, 40) radius 1.5 projected
  line L4 (35, 30) -> (35, 10) projected
  line L5 (100, 80) -> (100, 55)
  line L6 (115, 55) -> (100, 55)
  line L7 (100, 25) -> (115, 25)
  line L8 (115, 25) -> (115, 55)
  line L9 (100, 25) -> (100, 0)
  line L10 (50, 0) -> (50, 25)
  line L11 (50, 25) -> (35, 25)
  line L12 (50, 80) -> (50, 55)
  line L13 (50, 55) -> (35, 55)
  line L14 (35, 55) -> (35, 25)
  line L15 (105, 88) -> (85, 88) projected
  line L16 (65, 88) -> (45, 88) projected
  line L17 (85, -8) -> (105, -8) projected
  line L18 (45, -8) -> (65, -8) projected
  line L19 (45, -15) -> (45, -25) projected
  line L20 (50, 55) -> (50, 88)
  line L21 (100, 55) -> (100, 88)
  line L22 (50, 88) -> (100, 88)
  line L23 (100, 25) -> (100, -8)
  line L24 (50, 25) -> (50, -8)
  line L25 (50, -8) -> (100, -8)
  circle A5 centre (75, 40) radius 11
  point P0 (0, 0)
  dimension "d201" = 1
extrude "MarkBoardShape" add sketch "Sketch15" along normal blind 4 contours L8 L3 L7 L9 L23 L17 L25 L18 L24 L10 L11 L4 L14 L2 L13 L12 L20 L16 L22 L15 L21 L5 L1 L6 L0
sketch "Sketch19" plane through (0, 0, 3) normal (0, 0, 1) x (1, 0, 0)
  circle A0 centre (38, -5) radius 1.5 projected
  circle A1 centre (29, -5) radius 1.5 projected
  line L0 (25, -25) -> (25, -15) projected
  line L1 (25, -15) -> (45, -15) projected
  line L2 (45, -15) -> (45, -25) projected
  line L3 (45, -25) -> (25, -25) projected
  line L4 (-35.3051, 6.766) -> (-24.6985, 17.3726) projected
  line L5 (-24.6985, 17.3726) -> (-17.6274, 10.3015) projected
  line L6 (-17.6274, 10.3015) -> (-28.234, -0.3051) projected
  line L7 (-28.234, -0.3051) -> (-35.3051, 6.766) projected
  line L8 (5, -12) -> (5, -8) projected
  line L9 (5, -8) -> (25, -8) projected
  line L10 (25, -8) -> (25, -12) projected
  line L11 (25, -12) -> (5, -12) projected
  line L12 (13.2914, 15.7645) -> (27.4335, 29.9066) projected
  line L13 (27.4335, 29.9066) -> (30.262, 27.0782) projected
  line L14 (30.262, 27.0782) -> (16.1198, 12.9361) projected
  line L15 (16.1198, 12.9361) -> (13.2914, 15.7645) projected
  line L16 (-22.771, -25.9548) -> (-25.5995, -23.1264) projected
  line L17 (-25.5995, -23.1264) -> (-11.4573, -8.9842) projected
  line L18 (-11.4573, -8.9842) -> (-8.6289, -11.8127) projected
  line L19 (-8.6289, -11.8127) -> (-22.771, -25.9548) projected
  line L20 (-5.0932, 17.5663) -> (-7.9217, 14.7379) projected
  line L21 (-7.9217, 14.7379) -> (-22.0638, 28.88) projected
  line L22 (-22.0638, 28.88) -> (-19.2354, 31.7085) projected
  line L23 (-19.2354, 31.7085) -> (-5.0932, 17.5663) projected
  line L24 (-58.1264, 9.4005) -> (-60.9548, 12.229) projected
  line L25 (-60.9548, 12.229) -> (-46.8127, 26.3711) projected
  line L26 (-46.8127, 26.3711) -> (-43.9842, 23.5427) projected
  line L27 (-43.9842, 23.5427) -> (-58.1264, 9.4005) projected
  circle A2 centre (-40.4428, 35) radius 1.5 projected
  circle A3 centre (26.0122, 20) radius 1.5 projected
  circle A4 centre (15, -20) radius 1.5 projected
  circle A5 centre (-55, 30) radius 1.5 projected
  circle A6 centre (3.6899, -2.3223) radius 1.5 projected
  circle A7 centre (-16.8162, 18.1838) radius 1.5 projected
  circle A8 centre (55, -20) radius 1.5 projected
  circle A9 centre (-13.9878, -20) radius 1.5 projected
  circle A10 centre (-34.4939, 0.5061) radius 1.5 projected
  circle A11 centre (-55, 21.0122) radius 1.5 projected
  line L28 (105, -15) -> (125, -15) projected
  line L29 (125, -15) -> (125, -25) projected
  line L30 (125, -25) -> (105, -25) projected
  line L31 (105, -25) -> (105, -15) projected
  line L32 (167.6274, 10.3015) -> (174.6985, 17.3726) projected
  line L33 (174.6985, 17.3726) -> (185.3051, 6.766) projected
  line L34 (185.3051, 6.766) -> (178.234, -0.3051) projected
  line L35 (178.234, -0.3051) -> (167.6274, 10.3015) projected
  line L36 (196.8127, 26.3711) -> (210.9548, 12.229) projected
  line L37 (210.9548, 12.229) -> (208.1264, 9.4005) projected
  line L38 (208.1264, 9.4005) -> (193.9842, 23.5427) projected
  line L39 (193.9842, 23.5427) -> (196.8127, 26.3711) projected
  line L40 (119.738, 27.0782) -> (122.5665, 29.9066) projected
  line L41 (122.5665, 29.9066) -> (136.7086, 15.7645) projected
  line L42 (136.7086, 15.7645) -> (133.8802, 12.9361) projected
  line L43 (133.8802, 12.9361) -> (119.738, 27.0782) projected
  line L44 (125, -12) -> (125, -8) projected
  line L45 (125, -8) -> (145, -8) projected
  line L46 (145, -8) -> (145, -12) projected
  line L47 (145, -12) -> (125, -12) projected
  line L48 (161.4573, -8.9842) -> (175.5995, -23.1264) projected
  line L49 (175.5995, -23.1264) -> (172.771, -25.9548) projected
  line L50 (172.771, -25.9548) -> (158.6289, -11.8127) projected
  line L51 (158.6289, -11.8127) -> (161.4573, -8.9842) projected
  line L52 (172.0638, 28.88) -> (157.9217, 14.7379) projected
  line L53 (157.9217, 14.7379) -> (155.0932, 17.5663) projected
  line L54 (155.0932, 17.5663) -> (169.2354, 31.7085) projected
  line L55 (169.2354, 31.7085) -> (172.0638, 28.88) projected
  circle A12 centre (205, 21.0122) radius 1.5 projected
  circle A13 centre (163.9878, -20) radius 1.5 projected
  circle A14 centre (184.4939, 0.5061) radius 1.5 projected
  circle A15 centre (95, -20) radius 1.5 projected
  circle A16 centre (112, -5) radius 1.5 projected
  circle A17 centre (166.8162, 18.1838) radius 1.5 projected
  circle A18 centre (146.3101, -2.3223) radius 1.5 projected
  circle A19 centre (135, -20) radius 1.5 projected
  circle A20 centre (205, 30) radius 1.5 projected
  circle A21 centre (121, -5) radius 1.5 projected
  circle A22 centre (123.9878, 20) radius 1.5 projected
  circle A23 centre (190.4428, 35) radius 1.5 projected
  line L56 (45, 105) -> (45, 95) projected
  line L57 (45, 95) -> (25, 95) projected
  line L58 (25, 95) -> (25, 105) projected
  line L59 (25, 105) -> (45, 105) projected
  line L60 (-28.234, 80.3051) -> (-17.6274, 69.6985) projected
  line L61 (-17.6274, 69.6985) -> (-24.6985, 62.6274) projected
  line L62 (-24.6985, 62.6274) -> (-35.3051, 73.234) projected
  line L63 (-35.3051, 73.234) -> (-28.234, 80.3051) projected
  line L64 (-46.8127, 53.6289) -> (-60.9548, 67.771) projected
  line L65 (-60.9548, 67.771) -> (-58.1264, 70.5995) projected
  line L66 (-58.1264, 70.5995) -> (-43.9842, 56.4573) projected
  line L67 (-43.9842, 56.4573) -> (-46.8127, 53.6289) projected
  line L68 (-8.6289, 91.8127) -> (-11.4573, 88.9842) projected
  line L69 (-11.4573, 88.9842) -> (-25.5995, 103.1264) projected
  line L70 (-25.5995, 103.1264) -> (-22.771, 105.9548) projected
  line L71 (-22.771, 105.9548) -> (-8.6289, 91.8127) projected
  line L72 (-22.0638, 51.12) -> (-7.9217, 65.2621) projected
  line L73 (-7.9217, 65.2621) -> (-5.0932, 62.4337) projected
  line L74 (-5.0932, 62.4337) -> (-19.2354, 48.2915) projected
  line L75 (-19.2354, 48.2915) -> (-22.0638, 51.12) projected
  line L76 (13.2914, 64.2355) -> (16.1198, 67.0639) projected
  line L77 (16.1198, 67.0639) -> (30.262, 52.9218) projected
  line L78 (30.262, 52.9218) -> (27.4335, 50.0934) projected
  line L79 (27.4335, 50.0934) -> (13.2914, 64.2355) projected
  line L80 (25, 88) -> (5, 88) projected
  line L81 (5, 88) -> (5, 92) projected
  line L82 (5, 92) -> (25, 92) projected
  line L83 (25, 92) -> (25, 88) projected
  circle A24 centre (-55, 58.9878) radius 1.5 projected
  circle A25 centre (-13.9878, 100) radius 1.5 projected
  circle A26 centre (-34.4939, 79.4939) radius 1.5 projected
  circle A27 centre (55, 100) radius 1.5 projected
  circle A28 centre (-16.8162, 61.8162) radius 1.5 projected
  circle A29 centre (38, 85) radius 1.5 projected
  circle A30 centre (3.6899, 82.3223) radius 1.5 projected
  circle A31 centre (-55, 50) radius 1.5 projected
  circle A32 centre (15, 100) radius 1.5 projected
  circle A33 centre (29, 85) radius 1.5 projected
  circle A34 centre (26.0122, 60) radius 1.5 projected
  circle A35 centre (-40.4428, 45) radius 1.5 projected
  line L84 (105, 105) -> (125, 105) projected
  line L85 (125, 105) -> (125, 95) projected
  line L86 (125, 95) -> (105, 95) projected
  line L87 (105, 95) -> (105, 105) projected
  line L88 (174.6985, 62.6274) -> (167.6274, 69.6985) projected
  line L89 (167.6274, 69.6985) -> (178.234, 80.3051) projected
  line L90 (178.234, 80.3051) -> (185.3051, 73.234) projected
  line L91 (185.3051, 73.234) -> (174.6985, 62.6274) projected
  line L92 (193.9842, 56.4573) -> (208.1264, 70.5995) projected
  line L93 (208.1264, 70.5995) -> (210.9548, 67.771) projected
  line L94 (210.9548, 67.771) -> (196.8127, 53.6289) projected
  line L95 (196.8127, 53.6289) -> (193.9842, 56.4573) projected
  line L96 (145, 88) -> (125, 88) projected
  line L97 (125, 88) -> (125, 92) projected
  line L98 (125, 92) -> (145, 92) projected
  line L99 (145, 92) -> (145, 88) projected
  line L100 (158.6289, 91.8127) -> (172.771, 105.9548) projected
  line L101 (172.771, 105.9548) -> (175.5995, 103.1264) projected
  line L102 (175.5995, 103.1264) -> (161.4573, 88.9842) projected
  line L103 (161.4573, 88.9842) -> (158.6289, 91.8127) projected
  line L104 (155.0932, 62.4337) -> (157.9217, 65.2621) projected
  line L105 (157.9217, 65.2621) -> (172.0638, 51.12) projected
  line L106 (172.0638, 51.12) -> (169.2354, 48.2915) projected
  line L107 (169.2354, 48.2915) -> (155.0932, 62.4337) projected
  line L108 (136.7086, 64.2355) -> (122.5665, 50.0934) projected
  line L109 (122.5665, 50.0934) -> (119.738, 52.9218) projected
  line L110 (119.738, 52.9218) -> (133.8802, 67.0639) projected
  line L111 (133.8802, 67.0639) -> (136.7086, 64.2355) projected
  circle A36 centre (205, 58.9878) radius 1.5 projected
  circle A37 centre (184.4939, 79.4939) radius 1.5 projected
  circle A38 centre (163.9878, 100) radius 1.5 projected
  circle A39 centre (95, 100) radius 1.5 projected
  circle A40 centre (112, 85) radius 1.5 projected
  circle A41 centre (166.8162, 61.8162) radius 1.5 projected
  circle A42 centre (146.3101, 82.3223) radius 1.5 projected
  circle A43 centre (135, 100) radius 1.5 projected
  circle A44 centre (205, 50) radius 1.5 projected
  circle A45 centre (121, 85) radius 1.5 projected
  circle A46 centre (123.9878, 60) radius 1.5 projected
  circle A47 centre (190.4428, 45) radius 1.5 projected
  circle A48 centre (145, 40) radius 1.5 projected
  circle A49 centre (5, 40) radius 1.5 projected
  arc A50 (178.1142, -40) -> (75, -26.5) centre (73.8668, -435.7032) ccw projected
  arc A51 (225, 6.8858) -> (178.1142, -40) centre (305, -120) ccw projected
  line L112 (225, 6.8858) -> (225, 73.1142) projected
  arc A52 (178.1142, 120) -> (225, 73.1142) centre (305, 200) ccw projected
  arc A53 (75, 106.5) -> (178.1142, 120) centre (73.8668, 515.7032) ccw projected
  arc A54 (-28.1142, 120) -> (75, 106.5) centre (76.1332, 515.7032) ccw projected
  arc A55 (-75, 73.1142) -> (-28.1142, 120) centre (-155, 200) ccw projected
  line L113 (-75, 73.1142) -> (-75, 6.8858) projected
  arc A56 (-28.1142, -40) -> (-75, 6.8858) centre (-155, -120) ccw projected
  arc A57 (75, -26.5) -> (-28.1142, -40) centre (76.1332, -435.7032) ccw projected
  line L114 (35, 30) -> (35, 50) projected
  line L115 (35, 50) -> (31, 50) projected
  line L116 (31, 50) -> (31, 70) projected
  line L117 (31, 70) -> (35, 70) projected
  line L118 (35, 70) -> (35, 55) projected
  line L119 (35, 55) -> (40, 55) projected
  line L120 (40, 55) -> (40, 80) projected
  line L121 (40, 80) -> (50, 80) projected
  line L122 (50, 80) -> (50, 88) projected
  line L123 (50, 88) -> (45, 88) projected
  line L124 (45, 88) -> (45, 92) projected
  line L125 (45, 92) -> (65, 92) projected
  line L126 (65, 92) -> (65, 88) projected
  line L127 (65, 88) -> (85, 88) projected
  line L128 (85, 88) -> (85, 92) projected
  line L129 (85, 92) -> (105, 92) projected
  line L130 (105, 92) -> (105, 88) projected
  line L131 (105, 88) -> (100, 88) projected
  line L132 (100, 88) -> (100, 80) projected
  line L133 (100, 80) -> (110, 80) projected
  line L134 (110, 80) -> (110, 55) projected
  line L135 (110, 55) -> (115, 55) projected
  line L136 (115, 55) -> (115, 70) projected
  line L137 (115, 70) -> (119, 70) projected
  line L138 (119, 70) -> (119, 50) projected
  line L139 (119, 50) -> (115, 50) projected
  line L140 (115, 50) -> (115, 30) projected
  line L141 (115, 30) -> (119, 30) projected
  line L142 (119, 30) -> (119, 10) projected
  line L143 (119, 10) -> (115, 10) projected
  line L144 (115, 10) -> (115, 25) projected
  line L145 (115, 25) -> (110, 25) projected
  line L146 (110, 25) -> (110, 0) projected
  line L147 (110, 0) -> (100, 0) projected
  line L148 (100, 0) -> (100, -8) projected
  line L149 (100, -8) -> (105, -8) projected
  line L150 (105, -8) -> (105, -12) projected
  line L151 (105, -12) -> (85, -12) projected
  line L152 (85, -12) -> (85, -8) projected
  line L153 (85, -8) -> (65, -8) projected
  line L154 (65, -8) -> (65, -12) projected
  line L155 (65, -12) -> (45, -12) projected
  line L156 (45, -12) -> (45, -8) projected
  line L157 (45, -8) -> (50, -8) projected
  line L158 (50, -8) -> (50, 0) projected
  line L159 (50, 0) -> (40, 0) projected
  line L160 (40, 0) -> (40, 25) projected
  line L161 (40, 25) -> (35, 25) projected
  line L162 (35, 25) -> (35, 10) projected
  line L163 (35, 10) -> (31, 10) projected
  line L164 (31, 10) -> (31, 30) projected
  line L165 (31, 30) -> (35, 30) projected
  line L166 (-155, 200) -> (305, 200)
  line L167 (305, 200) -> (305, -120)
  line L168 (305, -120) -> (-155, -120)
  line L169 (-155, -120) -> (-155, 200)
  point P0 (0, 0)
extrude "RemoveBase" cut sketch "Sketch19" against normal through all contours A50 A57 A56 L113 A55 A54 A53 A52 L112 A51
sketch "Sketch20" plane through (0, 0, 7) normal (0, 0, 1) x (1, 0, 0)
  circle A0 centre (75, 40) radius 11 projected
  circle A1 centre (75, 40) radius 11
  point P0 (0, 0)
extrude "OffsetCenterHole" cut sketch "Sketch20" against normal through all
sketch "Sketch21" plane through (0, 0, 7) normal (0, 0, 1) x (1, 0, 0)
  line L0 (115, 55) -> (115, 25) projected
  line L1 (100, 55) -> (115, 55) projected
  line L2 (100, 88) -> (100, 55) projected
  line L3 (50, 88) -> (100, 88) projected
  line L4 (50, 55) -> (50, 88) projected
  line L5 (35, 55) -> (50, 55) projected
  line L6 (35, 25) -> (35, 55) projected
  line L7 (50, 25) -> (35, 25) projected
  line L8 (50, -8) -> (50, 25) projected
  line L9 (100, -8) -> (50, -8) projected
  line L10 (100, 25) -> (100, -8) projected
  line L11 (115, 25) -> (100, 25) projected
  line L12 (99.5, 87.5) -> (99.5, 54.5)
  line L13 (99.5, 54.5) -> (114.5, 54.5)
  line L14 (114.5, 54.5) -> (114.5, 25.5)
  line L15 (114.5, 25.5) -> (99.5, 25.5)
  line L16 (99.5, 25.5) -> (99.5, -7.5)
  line L17 (99.5, -7.5) -> (50.5, -7.5)
  line L18 (50.5, -7.5) -> (50.5, 25.5)
  line L19 (50.5, 25.5) -> (35.5, 25.5)
  line L20 (35.5, 25.5) -> (35.5, 54.5)
  line L21 (35.5, 54.5) -> (50.5, 54.5)
  line L22 (50.5, 54.5) -> (50.5, 87.5)
  line L23 (50.5, 87.5) -> (99.5, 87.5)
  point P0 (0, 0)
  dimension "d208" = 0.5
extrude "ContourOffset" cut sketch "Sketch21" against normal through all
sketch "Sketch22" plane through (0, 0, 7) normal (0, 0, 1) x (1, 0, 0)
  line L0 (50.5, 54.5) -> (35.5, 54.5) projected
  line L1 (99.5, 54.5) -> (99.5, 87.5) projected
  circle A0 centre (75, 40) radius 11 projected
  circle A1 centre (75, 71.11) radius 1.5 projected
  circle A2 centre (43.89, 40) radius 1.5 projected
  circle A3 centre (49.5, 54.5) radius 1
  line L2 (75, 40) -> (75, 71.11) construction
  line L3 (75, 40) -> (43.89, 40) construction
  circle A4 centre (49.5, 25.5) radius 1
  circle A5 centre (100.5, 54.5) radius 1
  circle A6 centre (100.5, 25.5) radius 1
  point P0 (0, 0)
  point P1 (106.11, 40)
  dimension "d211" = 2
extrude "MillCutouts" cut sketch "Sketch22" against normal through all contours A3 L0 | L0 A3 | A4 | A5 | A6
properties part number "Centerboard"
